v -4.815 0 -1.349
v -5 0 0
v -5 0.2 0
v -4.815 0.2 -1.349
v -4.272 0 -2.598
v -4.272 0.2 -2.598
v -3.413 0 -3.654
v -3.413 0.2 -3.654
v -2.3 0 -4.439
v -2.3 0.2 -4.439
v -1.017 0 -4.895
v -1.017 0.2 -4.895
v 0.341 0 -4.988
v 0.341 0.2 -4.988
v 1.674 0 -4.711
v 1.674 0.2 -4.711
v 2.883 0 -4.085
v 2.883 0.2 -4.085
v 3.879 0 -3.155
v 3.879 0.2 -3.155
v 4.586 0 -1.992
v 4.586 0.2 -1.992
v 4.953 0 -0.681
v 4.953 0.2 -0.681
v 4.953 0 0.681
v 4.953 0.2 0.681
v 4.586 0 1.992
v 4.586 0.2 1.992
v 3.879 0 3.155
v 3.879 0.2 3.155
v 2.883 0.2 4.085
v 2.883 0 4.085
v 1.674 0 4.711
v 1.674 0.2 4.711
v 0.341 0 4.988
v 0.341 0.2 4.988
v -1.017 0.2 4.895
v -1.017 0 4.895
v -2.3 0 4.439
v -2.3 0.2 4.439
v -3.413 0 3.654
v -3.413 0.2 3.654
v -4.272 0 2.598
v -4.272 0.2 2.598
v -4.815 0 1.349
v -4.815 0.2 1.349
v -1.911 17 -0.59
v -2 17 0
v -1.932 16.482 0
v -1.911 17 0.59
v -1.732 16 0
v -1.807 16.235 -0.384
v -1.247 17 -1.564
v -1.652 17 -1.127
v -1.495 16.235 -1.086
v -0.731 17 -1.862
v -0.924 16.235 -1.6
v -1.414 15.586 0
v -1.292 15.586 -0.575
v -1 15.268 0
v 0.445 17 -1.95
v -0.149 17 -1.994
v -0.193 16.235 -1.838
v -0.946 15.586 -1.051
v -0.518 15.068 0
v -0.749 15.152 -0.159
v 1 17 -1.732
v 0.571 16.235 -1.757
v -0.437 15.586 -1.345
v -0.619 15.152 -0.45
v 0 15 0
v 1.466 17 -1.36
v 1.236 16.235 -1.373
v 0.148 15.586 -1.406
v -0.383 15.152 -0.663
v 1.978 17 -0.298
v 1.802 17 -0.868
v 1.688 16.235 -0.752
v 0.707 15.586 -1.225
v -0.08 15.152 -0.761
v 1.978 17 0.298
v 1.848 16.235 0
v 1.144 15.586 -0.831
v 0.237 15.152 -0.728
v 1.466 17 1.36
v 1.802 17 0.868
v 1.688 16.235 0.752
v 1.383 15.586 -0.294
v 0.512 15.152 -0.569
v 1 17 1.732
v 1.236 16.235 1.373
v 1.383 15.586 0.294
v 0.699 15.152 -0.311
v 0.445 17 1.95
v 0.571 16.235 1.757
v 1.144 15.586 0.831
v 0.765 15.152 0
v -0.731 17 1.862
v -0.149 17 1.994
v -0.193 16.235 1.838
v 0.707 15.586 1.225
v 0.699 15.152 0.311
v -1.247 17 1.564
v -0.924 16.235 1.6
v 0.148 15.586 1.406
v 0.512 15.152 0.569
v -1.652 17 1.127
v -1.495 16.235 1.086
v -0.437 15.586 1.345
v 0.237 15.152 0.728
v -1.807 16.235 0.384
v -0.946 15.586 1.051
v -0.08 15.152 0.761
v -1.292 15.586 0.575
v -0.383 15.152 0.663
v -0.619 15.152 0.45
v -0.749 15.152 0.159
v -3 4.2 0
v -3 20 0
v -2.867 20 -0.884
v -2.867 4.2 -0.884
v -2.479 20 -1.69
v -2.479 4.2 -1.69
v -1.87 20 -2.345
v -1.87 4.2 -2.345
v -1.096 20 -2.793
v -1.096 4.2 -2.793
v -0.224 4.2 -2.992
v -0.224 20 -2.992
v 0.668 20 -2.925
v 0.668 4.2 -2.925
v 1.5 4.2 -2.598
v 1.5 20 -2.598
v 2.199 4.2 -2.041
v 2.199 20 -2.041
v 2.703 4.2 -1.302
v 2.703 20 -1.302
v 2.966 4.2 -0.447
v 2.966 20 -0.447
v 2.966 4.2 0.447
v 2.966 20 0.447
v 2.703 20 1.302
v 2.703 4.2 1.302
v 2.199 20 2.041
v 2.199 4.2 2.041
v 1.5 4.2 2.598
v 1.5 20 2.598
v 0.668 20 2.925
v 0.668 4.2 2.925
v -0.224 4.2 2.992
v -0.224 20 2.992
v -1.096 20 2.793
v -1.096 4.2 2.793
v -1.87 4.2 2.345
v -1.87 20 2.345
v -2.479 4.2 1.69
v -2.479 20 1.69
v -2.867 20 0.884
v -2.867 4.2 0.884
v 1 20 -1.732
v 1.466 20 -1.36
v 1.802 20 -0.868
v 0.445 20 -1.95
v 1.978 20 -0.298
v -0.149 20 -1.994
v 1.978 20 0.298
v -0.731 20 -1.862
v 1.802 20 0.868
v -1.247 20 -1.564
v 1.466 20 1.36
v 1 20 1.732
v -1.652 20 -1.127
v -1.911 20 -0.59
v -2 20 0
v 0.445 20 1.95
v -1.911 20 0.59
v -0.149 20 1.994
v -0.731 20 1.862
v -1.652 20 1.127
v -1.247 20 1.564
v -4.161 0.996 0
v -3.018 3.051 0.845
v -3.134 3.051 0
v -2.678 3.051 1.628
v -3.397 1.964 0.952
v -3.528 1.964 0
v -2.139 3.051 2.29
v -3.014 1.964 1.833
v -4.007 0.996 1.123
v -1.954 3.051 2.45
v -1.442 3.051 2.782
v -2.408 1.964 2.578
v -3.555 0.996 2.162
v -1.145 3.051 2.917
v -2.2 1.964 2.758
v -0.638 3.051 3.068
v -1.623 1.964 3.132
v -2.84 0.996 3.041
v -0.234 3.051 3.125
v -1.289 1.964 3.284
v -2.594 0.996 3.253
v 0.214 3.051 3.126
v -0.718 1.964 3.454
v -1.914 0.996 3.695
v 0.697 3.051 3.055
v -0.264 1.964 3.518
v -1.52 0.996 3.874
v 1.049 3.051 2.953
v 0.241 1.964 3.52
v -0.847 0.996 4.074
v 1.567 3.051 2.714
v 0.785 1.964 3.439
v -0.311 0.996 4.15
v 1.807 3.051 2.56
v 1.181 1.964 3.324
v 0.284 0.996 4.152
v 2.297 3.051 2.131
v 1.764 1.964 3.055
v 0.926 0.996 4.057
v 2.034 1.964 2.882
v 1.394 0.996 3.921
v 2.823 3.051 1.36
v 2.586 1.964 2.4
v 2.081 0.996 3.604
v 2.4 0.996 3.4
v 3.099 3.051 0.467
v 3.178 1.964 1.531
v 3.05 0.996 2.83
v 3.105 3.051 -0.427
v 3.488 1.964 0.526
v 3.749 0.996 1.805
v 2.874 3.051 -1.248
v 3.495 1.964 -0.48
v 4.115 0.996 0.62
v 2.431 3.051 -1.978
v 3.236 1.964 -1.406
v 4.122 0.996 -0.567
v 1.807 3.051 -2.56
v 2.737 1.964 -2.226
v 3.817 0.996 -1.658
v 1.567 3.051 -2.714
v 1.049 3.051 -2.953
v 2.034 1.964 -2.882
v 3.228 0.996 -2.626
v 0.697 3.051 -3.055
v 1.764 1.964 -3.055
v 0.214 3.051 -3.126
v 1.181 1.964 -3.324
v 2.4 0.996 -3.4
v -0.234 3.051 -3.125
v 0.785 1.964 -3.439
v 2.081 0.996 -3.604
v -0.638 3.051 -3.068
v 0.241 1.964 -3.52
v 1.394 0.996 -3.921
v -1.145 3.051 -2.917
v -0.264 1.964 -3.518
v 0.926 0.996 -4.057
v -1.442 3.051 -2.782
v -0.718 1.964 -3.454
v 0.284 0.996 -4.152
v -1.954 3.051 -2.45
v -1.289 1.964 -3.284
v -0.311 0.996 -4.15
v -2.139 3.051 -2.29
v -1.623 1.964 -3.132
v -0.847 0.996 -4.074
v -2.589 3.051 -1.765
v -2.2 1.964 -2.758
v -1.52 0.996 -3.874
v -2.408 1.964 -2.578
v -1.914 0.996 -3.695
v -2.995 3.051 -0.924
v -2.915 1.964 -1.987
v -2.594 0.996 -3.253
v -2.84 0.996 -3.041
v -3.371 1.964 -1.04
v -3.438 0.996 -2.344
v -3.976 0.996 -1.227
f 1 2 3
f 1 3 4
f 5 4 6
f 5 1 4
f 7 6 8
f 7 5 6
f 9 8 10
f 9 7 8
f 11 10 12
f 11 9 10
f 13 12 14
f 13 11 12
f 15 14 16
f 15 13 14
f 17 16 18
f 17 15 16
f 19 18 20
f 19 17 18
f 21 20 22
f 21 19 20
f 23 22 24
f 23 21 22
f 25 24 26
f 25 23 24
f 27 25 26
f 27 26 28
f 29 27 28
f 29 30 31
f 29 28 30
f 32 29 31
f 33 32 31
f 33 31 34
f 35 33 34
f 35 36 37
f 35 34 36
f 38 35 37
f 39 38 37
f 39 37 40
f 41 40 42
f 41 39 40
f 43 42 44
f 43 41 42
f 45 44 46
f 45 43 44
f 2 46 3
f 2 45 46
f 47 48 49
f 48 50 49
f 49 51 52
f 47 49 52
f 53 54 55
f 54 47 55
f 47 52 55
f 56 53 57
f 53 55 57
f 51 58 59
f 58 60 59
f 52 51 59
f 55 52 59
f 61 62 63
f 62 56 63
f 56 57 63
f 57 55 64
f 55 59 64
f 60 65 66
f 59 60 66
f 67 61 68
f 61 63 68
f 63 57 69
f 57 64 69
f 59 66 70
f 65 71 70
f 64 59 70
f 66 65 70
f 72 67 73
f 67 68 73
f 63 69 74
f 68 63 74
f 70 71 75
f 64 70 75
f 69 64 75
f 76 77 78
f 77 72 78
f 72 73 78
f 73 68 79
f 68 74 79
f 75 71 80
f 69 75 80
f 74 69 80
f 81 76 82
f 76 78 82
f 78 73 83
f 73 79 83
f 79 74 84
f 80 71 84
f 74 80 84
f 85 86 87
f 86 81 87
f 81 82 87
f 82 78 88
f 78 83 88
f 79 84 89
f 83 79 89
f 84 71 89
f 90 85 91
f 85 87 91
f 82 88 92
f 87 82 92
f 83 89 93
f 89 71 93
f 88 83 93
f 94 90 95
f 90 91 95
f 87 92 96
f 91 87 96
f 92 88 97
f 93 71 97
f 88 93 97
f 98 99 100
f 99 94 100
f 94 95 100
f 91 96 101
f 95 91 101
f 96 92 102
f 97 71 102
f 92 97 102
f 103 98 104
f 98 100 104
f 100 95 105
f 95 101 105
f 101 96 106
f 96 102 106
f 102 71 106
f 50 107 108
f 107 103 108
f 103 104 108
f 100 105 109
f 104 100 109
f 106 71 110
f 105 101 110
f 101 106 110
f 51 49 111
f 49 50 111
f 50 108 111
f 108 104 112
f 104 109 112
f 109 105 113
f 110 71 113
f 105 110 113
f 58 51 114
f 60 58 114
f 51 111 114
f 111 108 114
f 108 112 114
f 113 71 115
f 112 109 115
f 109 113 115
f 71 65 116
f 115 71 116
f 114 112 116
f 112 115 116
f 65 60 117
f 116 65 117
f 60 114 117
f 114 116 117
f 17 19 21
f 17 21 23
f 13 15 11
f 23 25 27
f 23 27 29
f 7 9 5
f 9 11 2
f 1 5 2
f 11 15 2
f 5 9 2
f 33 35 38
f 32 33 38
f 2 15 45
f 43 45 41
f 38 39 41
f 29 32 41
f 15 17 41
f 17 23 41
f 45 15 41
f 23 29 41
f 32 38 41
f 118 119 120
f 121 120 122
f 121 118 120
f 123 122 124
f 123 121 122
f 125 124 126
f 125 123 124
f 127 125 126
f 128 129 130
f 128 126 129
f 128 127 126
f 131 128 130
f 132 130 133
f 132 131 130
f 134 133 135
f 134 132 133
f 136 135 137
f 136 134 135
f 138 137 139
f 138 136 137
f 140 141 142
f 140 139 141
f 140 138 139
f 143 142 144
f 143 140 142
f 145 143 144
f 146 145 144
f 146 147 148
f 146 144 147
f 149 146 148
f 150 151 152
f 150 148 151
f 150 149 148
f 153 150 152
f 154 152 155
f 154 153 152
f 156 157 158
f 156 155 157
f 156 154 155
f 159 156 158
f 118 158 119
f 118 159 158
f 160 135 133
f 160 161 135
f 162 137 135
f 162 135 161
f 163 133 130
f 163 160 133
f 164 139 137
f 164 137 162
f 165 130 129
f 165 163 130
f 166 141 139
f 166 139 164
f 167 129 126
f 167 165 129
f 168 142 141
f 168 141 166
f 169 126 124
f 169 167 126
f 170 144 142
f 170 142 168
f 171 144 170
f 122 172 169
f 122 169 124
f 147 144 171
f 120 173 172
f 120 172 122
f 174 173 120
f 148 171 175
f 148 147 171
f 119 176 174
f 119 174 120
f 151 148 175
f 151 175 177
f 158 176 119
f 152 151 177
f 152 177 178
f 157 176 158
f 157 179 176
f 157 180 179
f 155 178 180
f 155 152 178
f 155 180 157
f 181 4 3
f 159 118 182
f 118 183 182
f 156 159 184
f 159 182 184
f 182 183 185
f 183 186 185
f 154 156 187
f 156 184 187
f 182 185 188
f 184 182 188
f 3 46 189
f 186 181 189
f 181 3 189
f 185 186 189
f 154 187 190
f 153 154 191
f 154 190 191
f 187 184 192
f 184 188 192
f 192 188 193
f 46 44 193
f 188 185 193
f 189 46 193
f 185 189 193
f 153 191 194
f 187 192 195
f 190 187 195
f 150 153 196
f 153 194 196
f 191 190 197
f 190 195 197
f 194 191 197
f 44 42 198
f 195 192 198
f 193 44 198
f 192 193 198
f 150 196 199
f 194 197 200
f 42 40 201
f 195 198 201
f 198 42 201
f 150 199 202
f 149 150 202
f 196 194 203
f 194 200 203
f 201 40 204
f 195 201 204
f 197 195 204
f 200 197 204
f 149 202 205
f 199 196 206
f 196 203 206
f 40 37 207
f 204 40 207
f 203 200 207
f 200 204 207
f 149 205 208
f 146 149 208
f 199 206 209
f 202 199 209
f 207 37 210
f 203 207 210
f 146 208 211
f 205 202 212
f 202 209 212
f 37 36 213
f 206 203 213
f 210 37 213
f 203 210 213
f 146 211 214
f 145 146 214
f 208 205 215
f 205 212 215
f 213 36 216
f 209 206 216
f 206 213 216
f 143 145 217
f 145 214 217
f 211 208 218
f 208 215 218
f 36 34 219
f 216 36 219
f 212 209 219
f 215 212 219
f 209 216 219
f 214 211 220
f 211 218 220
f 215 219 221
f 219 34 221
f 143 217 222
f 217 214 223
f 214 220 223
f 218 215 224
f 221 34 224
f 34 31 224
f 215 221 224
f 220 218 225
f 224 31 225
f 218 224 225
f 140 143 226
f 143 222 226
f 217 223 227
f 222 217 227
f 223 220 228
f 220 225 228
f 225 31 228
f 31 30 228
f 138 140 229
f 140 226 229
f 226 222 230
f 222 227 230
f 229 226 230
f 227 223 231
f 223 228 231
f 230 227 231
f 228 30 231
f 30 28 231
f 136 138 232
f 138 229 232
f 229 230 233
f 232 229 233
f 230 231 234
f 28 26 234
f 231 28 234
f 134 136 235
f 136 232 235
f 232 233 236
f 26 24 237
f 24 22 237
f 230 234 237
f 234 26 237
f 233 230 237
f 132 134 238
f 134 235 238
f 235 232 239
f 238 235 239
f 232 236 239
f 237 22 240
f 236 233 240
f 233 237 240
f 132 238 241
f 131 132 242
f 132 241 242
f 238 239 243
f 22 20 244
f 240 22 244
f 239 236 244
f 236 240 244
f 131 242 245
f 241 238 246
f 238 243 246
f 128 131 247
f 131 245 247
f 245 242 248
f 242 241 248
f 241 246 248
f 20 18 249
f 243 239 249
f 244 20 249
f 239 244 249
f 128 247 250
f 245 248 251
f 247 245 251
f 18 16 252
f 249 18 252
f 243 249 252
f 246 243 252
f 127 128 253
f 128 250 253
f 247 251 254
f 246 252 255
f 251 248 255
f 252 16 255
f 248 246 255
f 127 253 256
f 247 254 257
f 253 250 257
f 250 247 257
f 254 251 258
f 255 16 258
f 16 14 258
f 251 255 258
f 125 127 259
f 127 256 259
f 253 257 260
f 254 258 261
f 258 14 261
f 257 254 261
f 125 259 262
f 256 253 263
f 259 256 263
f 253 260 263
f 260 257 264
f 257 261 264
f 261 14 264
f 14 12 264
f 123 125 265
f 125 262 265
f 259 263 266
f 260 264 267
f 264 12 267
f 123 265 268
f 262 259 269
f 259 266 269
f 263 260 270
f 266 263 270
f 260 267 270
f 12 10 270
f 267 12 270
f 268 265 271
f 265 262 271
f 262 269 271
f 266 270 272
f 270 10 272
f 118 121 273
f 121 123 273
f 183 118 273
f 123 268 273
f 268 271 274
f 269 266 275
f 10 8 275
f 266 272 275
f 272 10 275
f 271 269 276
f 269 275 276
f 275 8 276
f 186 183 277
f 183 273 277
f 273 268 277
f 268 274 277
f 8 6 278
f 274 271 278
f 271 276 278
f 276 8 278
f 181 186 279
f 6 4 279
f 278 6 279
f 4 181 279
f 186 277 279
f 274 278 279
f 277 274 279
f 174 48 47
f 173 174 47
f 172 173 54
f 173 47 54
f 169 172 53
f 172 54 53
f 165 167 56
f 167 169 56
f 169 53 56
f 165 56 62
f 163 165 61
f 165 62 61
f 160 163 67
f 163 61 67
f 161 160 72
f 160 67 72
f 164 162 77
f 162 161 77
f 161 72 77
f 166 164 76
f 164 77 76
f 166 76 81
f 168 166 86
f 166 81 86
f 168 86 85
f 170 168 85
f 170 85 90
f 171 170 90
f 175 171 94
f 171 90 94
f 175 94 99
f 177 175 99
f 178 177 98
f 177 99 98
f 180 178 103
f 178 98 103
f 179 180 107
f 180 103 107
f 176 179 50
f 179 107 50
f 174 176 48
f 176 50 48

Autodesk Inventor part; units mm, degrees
ref_plane "YZ Plane" through (0, 0, 0) normal (1, 0, 0) x (0, 1, 0)
ref_plane "XZ Plane" through (0, 0, 0) normal (0, 1, 0) x (-1, 0, 0)
ref_plane "XY Plane" through (0, 0, 0) normal (0, 0, 1) x (1, 0, 0)
sketch "Sketch1" plane through (0, 0, 0) normal (0, 1, 0) x (-1, 0, 0)
  circle A0 centre (0, 0) radius 2
  circle A1 centre (0, 0) radius 3
  circle A2 centre (0, 0) radius 5
  dimension "d0" = 4
  dimension "d1" = 6
  dimension "d2" = 10
extrude "Extrusion1" add sketch "Sketch1" along normal blind 0.2 contours A1 | A2
extrude "Extrusion2" add sketch "Sketch1" along normal blind 20 contours A1
fillet "Fillet1" radius 5 1 edges at (3, 0.2, 0)
extrude "Extrusion3" add sketch "Sketch1" along normal blind 15 contours A0
fillet "Fillet2" radius 2 1 edges at (2, 15, 0)
properties part number "ssd standoff"
